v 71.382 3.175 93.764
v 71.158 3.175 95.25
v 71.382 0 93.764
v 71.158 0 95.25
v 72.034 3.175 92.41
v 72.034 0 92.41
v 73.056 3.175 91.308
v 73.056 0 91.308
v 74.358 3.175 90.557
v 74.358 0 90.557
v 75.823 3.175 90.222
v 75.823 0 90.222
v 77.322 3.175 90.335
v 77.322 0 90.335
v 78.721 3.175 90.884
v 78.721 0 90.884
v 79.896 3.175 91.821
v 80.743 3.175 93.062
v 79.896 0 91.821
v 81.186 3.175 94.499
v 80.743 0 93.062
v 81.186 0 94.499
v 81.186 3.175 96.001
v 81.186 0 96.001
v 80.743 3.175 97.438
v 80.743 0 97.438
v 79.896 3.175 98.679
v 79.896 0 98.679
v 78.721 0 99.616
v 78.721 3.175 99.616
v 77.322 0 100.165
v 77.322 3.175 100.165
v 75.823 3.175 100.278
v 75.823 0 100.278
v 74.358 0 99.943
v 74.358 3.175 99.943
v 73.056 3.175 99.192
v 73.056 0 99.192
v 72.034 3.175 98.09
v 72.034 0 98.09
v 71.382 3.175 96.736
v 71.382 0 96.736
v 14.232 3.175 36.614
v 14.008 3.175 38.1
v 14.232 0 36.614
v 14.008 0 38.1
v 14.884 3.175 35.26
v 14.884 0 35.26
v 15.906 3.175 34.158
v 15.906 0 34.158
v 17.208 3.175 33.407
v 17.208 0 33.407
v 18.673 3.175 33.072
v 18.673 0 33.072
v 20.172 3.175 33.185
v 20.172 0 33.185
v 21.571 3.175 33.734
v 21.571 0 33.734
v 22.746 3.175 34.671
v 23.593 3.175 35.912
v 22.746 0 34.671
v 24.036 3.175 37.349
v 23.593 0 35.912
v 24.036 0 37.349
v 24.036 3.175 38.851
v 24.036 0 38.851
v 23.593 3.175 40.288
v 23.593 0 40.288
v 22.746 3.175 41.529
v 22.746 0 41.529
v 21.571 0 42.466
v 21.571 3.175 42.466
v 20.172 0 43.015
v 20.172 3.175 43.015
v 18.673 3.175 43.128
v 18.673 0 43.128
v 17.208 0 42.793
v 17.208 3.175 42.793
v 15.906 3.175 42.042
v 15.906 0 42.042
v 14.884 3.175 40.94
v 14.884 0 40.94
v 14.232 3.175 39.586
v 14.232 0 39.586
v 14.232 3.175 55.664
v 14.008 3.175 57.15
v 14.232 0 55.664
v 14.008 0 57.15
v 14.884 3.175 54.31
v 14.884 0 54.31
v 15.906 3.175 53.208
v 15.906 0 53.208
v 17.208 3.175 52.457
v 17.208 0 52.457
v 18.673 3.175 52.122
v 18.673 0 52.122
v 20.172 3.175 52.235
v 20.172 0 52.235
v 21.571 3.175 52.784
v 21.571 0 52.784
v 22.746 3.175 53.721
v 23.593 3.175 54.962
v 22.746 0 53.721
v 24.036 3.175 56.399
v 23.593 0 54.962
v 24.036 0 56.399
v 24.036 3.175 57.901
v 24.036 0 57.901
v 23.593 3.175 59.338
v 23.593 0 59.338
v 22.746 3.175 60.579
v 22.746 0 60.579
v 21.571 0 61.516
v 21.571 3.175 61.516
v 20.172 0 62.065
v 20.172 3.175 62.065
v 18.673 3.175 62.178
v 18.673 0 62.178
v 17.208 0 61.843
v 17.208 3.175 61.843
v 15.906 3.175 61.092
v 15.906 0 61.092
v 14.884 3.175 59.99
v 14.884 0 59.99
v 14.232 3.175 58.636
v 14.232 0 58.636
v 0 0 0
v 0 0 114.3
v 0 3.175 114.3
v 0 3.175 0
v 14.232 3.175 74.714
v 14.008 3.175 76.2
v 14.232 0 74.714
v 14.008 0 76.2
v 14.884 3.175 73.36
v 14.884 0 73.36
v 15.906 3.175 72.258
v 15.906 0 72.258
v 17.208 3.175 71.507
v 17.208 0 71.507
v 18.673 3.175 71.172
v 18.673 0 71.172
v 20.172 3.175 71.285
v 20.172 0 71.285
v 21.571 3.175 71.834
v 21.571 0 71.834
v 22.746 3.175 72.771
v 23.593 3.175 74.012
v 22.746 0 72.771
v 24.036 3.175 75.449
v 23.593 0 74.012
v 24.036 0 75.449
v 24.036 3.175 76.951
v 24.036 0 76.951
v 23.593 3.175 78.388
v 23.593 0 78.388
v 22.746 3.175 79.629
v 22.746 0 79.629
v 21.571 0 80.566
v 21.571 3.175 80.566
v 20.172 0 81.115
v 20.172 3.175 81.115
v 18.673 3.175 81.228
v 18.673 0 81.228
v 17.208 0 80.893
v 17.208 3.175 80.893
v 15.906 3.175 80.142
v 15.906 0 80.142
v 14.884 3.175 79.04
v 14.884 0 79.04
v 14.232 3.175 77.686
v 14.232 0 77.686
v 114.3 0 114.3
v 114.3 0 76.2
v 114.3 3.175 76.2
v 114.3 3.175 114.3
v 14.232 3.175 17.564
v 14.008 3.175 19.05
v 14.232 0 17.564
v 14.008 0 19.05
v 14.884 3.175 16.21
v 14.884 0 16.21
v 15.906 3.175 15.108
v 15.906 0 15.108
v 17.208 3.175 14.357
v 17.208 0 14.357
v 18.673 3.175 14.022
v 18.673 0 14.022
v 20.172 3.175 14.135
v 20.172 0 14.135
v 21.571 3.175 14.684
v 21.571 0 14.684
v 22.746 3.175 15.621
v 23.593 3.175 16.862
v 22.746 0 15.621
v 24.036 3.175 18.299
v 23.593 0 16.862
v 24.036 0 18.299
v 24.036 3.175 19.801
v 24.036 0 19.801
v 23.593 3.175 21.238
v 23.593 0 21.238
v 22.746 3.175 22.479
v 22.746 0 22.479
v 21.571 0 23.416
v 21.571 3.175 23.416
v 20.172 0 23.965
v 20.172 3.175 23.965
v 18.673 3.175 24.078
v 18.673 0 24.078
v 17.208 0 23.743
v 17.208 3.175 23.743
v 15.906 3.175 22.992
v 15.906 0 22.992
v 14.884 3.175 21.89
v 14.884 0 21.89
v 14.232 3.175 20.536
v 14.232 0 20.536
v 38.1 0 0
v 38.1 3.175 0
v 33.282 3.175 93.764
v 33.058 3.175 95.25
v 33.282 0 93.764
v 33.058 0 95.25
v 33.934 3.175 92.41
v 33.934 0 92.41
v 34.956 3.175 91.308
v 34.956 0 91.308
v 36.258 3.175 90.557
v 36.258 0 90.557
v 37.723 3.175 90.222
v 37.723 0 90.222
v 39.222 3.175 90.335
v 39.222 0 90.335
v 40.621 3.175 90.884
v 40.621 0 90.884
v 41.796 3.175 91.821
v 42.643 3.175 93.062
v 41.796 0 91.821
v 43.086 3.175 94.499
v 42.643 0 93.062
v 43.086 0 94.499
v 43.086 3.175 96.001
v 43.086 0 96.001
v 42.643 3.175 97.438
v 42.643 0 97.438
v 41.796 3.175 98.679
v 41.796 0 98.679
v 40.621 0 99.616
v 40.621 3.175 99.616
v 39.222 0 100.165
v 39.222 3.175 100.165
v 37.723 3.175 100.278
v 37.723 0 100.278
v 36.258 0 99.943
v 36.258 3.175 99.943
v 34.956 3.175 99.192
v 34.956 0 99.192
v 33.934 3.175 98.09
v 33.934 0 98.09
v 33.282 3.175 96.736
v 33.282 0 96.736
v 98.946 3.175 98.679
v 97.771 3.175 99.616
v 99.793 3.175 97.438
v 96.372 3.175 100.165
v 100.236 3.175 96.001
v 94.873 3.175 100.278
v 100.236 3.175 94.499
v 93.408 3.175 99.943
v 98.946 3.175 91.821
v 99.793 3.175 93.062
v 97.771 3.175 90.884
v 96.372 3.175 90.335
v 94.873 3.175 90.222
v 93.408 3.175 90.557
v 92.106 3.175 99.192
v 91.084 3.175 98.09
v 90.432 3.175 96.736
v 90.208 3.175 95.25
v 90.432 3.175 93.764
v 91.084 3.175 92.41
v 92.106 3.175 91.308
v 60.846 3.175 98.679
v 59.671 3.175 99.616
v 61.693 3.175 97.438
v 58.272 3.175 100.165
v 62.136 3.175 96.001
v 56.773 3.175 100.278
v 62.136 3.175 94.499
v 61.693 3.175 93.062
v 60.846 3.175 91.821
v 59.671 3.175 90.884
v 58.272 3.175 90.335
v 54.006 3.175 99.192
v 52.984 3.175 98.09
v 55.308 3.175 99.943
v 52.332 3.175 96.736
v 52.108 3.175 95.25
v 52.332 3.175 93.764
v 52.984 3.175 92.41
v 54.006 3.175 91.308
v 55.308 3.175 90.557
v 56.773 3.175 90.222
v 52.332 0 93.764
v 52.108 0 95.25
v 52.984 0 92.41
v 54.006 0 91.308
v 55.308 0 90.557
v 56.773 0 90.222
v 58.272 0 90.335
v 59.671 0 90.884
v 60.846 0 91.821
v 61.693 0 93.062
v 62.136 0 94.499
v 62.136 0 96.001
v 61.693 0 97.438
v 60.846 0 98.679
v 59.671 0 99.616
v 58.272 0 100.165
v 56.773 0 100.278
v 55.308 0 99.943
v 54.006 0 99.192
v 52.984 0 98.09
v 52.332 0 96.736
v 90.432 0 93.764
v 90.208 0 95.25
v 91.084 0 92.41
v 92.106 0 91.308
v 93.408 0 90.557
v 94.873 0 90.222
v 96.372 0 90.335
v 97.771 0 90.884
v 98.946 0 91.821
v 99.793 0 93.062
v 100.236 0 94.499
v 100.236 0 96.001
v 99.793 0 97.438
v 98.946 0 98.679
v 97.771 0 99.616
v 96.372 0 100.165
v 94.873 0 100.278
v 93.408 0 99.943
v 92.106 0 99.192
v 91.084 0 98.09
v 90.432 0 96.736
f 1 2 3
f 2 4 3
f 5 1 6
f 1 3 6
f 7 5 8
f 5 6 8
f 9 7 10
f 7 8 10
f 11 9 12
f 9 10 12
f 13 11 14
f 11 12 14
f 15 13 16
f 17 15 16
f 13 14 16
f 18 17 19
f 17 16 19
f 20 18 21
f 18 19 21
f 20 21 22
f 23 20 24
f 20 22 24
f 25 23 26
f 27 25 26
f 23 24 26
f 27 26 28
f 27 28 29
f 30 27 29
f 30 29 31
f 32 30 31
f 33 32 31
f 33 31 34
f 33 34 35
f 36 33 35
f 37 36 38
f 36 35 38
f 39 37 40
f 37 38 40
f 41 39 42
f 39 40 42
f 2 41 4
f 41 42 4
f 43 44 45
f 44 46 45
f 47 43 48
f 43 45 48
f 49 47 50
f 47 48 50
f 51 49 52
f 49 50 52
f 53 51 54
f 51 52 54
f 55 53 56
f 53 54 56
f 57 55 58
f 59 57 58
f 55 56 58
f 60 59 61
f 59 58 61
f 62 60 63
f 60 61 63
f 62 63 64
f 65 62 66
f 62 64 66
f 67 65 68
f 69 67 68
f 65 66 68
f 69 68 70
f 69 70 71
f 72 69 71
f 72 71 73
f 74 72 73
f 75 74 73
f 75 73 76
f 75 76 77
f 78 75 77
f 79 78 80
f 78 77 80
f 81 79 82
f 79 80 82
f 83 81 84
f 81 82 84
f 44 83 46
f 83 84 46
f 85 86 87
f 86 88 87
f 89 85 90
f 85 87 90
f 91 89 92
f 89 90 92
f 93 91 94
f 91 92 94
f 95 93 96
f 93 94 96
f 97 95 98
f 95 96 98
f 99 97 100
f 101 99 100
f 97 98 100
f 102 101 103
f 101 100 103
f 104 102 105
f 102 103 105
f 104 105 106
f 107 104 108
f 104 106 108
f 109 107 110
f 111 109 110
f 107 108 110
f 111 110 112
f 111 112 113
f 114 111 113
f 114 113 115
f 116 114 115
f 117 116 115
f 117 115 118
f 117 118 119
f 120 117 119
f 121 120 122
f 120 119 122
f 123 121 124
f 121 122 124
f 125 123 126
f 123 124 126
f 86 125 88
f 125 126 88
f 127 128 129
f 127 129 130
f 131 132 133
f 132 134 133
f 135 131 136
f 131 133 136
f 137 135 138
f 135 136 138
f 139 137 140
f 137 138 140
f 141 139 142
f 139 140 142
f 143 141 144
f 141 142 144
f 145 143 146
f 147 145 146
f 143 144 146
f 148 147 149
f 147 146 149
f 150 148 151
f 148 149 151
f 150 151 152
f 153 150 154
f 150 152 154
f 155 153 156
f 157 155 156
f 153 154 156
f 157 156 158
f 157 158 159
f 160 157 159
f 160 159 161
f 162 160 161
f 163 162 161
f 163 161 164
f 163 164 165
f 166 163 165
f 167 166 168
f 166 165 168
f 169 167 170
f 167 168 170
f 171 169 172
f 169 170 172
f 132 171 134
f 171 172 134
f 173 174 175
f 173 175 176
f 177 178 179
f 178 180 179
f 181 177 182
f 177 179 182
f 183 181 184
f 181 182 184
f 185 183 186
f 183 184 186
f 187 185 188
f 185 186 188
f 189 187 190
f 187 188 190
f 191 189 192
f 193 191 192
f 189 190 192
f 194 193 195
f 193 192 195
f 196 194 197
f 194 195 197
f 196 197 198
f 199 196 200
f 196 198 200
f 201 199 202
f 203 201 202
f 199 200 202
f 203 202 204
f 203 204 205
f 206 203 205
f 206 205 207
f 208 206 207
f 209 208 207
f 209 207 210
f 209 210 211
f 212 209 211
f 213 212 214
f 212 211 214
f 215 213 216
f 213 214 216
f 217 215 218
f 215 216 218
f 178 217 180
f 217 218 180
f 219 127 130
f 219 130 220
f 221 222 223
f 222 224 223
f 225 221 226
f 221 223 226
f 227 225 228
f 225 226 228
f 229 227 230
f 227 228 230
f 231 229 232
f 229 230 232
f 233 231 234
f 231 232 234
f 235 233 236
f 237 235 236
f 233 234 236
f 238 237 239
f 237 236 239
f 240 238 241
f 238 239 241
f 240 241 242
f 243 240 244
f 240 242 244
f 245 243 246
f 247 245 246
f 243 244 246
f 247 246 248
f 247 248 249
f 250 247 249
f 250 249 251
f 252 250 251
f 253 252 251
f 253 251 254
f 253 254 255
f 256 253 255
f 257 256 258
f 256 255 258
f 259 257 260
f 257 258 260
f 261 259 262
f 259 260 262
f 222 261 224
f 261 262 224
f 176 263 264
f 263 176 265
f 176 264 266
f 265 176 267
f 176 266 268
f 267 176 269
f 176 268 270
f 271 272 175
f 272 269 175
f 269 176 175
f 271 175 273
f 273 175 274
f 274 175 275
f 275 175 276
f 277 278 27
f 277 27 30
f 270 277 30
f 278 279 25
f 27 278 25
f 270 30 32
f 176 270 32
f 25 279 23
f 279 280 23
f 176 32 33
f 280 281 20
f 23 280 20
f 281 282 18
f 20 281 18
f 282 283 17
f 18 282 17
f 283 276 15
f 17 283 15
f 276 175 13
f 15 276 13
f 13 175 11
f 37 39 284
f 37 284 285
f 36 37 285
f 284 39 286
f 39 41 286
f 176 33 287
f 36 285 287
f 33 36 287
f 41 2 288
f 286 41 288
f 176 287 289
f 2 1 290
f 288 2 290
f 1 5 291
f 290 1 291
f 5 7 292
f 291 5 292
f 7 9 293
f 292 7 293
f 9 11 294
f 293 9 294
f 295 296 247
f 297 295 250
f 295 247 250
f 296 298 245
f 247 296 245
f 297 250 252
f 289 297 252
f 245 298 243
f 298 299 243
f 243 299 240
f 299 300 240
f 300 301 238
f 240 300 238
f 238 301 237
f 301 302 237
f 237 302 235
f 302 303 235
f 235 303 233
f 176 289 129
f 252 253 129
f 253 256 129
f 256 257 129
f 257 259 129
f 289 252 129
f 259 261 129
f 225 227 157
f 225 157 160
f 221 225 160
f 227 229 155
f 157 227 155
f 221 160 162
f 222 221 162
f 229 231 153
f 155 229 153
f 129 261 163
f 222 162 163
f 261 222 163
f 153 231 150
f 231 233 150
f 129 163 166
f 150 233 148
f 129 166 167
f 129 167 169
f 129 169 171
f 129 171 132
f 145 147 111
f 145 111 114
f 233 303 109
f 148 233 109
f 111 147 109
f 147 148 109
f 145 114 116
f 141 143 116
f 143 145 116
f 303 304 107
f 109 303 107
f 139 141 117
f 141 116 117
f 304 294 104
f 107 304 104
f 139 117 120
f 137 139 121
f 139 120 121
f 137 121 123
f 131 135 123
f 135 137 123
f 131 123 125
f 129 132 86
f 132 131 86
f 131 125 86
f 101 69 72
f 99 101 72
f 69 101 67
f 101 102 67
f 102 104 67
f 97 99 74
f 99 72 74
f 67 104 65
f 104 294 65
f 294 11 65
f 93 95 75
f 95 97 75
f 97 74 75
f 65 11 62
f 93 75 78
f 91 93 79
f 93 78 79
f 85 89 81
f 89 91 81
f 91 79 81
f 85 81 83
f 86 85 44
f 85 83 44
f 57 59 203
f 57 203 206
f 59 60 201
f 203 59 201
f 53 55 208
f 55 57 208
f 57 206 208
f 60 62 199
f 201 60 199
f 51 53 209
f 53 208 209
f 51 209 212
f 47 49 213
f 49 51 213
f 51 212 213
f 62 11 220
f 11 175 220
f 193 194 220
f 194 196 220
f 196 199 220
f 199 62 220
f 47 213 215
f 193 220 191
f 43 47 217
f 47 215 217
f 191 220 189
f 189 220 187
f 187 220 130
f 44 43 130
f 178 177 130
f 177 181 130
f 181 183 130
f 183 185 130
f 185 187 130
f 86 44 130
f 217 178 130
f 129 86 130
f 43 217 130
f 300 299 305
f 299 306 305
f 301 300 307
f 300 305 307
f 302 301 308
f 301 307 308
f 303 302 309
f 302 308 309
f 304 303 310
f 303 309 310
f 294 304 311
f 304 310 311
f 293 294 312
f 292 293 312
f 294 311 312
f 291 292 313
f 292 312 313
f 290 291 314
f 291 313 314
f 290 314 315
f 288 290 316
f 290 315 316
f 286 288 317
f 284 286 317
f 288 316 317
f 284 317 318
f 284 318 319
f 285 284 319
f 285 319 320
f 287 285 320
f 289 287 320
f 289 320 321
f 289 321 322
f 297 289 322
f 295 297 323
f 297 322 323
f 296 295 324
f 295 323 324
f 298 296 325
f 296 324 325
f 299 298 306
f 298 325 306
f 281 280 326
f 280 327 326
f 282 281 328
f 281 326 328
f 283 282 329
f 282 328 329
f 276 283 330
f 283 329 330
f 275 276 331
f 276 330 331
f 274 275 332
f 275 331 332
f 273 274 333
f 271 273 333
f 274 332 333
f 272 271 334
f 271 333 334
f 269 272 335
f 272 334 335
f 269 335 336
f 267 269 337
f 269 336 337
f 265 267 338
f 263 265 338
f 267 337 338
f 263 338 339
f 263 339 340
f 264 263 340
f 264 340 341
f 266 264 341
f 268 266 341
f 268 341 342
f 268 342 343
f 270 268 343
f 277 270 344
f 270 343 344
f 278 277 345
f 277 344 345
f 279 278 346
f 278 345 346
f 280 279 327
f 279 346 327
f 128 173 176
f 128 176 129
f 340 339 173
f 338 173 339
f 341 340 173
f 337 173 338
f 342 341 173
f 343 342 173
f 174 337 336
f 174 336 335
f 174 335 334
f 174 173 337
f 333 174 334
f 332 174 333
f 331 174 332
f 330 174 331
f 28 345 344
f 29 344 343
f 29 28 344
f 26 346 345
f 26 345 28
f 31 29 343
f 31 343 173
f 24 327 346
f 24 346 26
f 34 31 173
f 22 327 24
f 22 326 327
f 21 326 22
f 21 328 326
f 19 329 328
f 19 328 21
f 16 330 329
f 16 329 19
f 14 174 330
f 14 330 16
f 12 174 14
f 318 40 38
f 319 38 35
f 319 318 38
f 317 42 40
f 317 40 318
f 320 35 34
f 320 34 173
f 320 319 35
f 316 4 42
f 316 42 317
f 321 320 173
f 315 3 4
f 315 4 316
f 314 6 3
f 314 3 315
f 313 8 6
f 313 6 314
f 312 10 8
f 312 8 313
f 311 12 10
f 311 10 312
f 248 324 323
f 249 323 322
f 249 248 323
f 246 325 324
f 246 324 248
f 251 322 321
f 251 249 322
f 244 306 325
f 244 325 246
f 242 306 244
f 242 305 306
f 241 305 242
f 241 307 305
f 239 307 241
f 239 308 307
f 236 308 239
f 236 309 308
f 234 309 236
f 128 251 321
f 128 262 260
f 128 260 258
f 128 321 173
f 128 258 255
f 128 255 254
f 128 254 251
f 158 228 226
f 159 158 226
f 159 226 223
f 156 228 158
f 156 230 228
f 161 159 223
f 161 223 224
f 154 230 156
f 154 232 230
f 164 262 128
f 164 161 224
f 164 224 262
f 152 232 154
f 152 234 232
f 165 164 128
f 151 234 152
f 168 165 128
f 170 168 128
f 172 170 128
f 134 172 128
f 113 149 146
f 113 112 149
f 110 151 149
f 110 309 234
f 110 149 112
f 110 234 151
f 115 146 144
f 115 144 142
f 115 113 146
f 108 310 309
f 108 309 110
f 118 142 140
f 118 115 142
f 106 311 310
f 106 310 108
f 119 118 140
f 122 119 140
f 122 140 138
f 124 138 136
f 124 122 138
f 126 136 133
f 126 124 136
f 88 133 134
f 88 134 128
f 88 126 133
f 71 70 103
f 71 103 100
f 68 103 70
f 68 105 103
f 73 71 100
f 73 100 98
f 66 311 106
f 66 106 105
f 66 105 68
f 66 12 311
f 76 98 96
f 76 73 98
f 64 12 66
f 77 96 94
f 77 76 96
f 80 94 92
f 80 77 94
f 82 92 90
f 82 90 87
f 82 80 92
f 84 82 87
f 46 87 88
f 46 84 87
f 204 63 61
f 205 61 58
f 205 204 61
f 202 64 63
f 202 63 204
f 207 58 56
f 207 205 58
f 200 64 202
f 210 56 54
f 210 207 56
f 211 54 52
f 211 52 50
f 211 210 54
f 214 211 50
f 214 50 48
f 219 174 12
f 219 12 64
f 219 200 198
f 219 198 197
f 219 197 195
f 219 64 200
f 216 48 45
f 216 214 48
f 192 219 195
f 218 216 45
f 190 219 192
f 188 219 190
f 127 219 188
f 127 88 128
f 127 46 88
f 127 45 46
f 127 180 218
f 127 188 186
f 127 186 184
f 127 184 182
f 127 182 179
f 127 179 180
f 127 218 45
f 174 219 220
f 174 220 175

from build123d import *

# Parameters (mm, degrees)
BOSS_EXTRUDE1_DEPTH         = 3.175
F_3_8_CLEARANCE_HOLE1_D     = 10.0838
F_3_8_CLEARANCE_HOLE1_DEPTH = 3.175
F_3_8_CLEARANCE_HOLE1_TIP   = 3.029479155


with BuildPart() as part:
    # Sketch1 → Boss-Extrude1 (new body)
    with BuildSketch(Plane(origin=(0, 0, 0), x_dir=(1, 0, 0), z_dir=(0, 1, 0))):
        Polygon((0, 0), (38.1, 0), (114.3, -76.2), (114.3, -114.3), (0, -114.3), align=None)
    extrude(amount=BOSS_EXTRUDE1_DEPTH)

    # 3/8 Clearance Hole1
    with Locations(Plane(origin=(0, 3.175, 0), x_dir=(1, 0, 0), z_dir=(0, 1, 0))):
        with Locations((19.05, -19.05), (19.05, -38.1), (19.05, -57.15), (19.05, -76.2), (38.1, -95.25), (57.15, -95.25), (76.2, -95.25), (95.25, -95.25)):
            Hole(F_3_8_CLEARANCE_HOLE1_D / 2, depth=F_3_8_CLEARANCE_HOLE1_DEPTH)
            with Locations((0, 0, -(F_3_8_CLEARANCE_HOLE1_DEPTH + F_3_8_CLEARANCE_HOLE1_TIP / 2))):  # 118° drill point
                Cone(0, F_3_8_CLEARANCE_HOLE1_D / 2, F_3_8_CLEARANCE_HOLE1_TIP, mode=Mode.SUBTRACT)


solid = part.part
